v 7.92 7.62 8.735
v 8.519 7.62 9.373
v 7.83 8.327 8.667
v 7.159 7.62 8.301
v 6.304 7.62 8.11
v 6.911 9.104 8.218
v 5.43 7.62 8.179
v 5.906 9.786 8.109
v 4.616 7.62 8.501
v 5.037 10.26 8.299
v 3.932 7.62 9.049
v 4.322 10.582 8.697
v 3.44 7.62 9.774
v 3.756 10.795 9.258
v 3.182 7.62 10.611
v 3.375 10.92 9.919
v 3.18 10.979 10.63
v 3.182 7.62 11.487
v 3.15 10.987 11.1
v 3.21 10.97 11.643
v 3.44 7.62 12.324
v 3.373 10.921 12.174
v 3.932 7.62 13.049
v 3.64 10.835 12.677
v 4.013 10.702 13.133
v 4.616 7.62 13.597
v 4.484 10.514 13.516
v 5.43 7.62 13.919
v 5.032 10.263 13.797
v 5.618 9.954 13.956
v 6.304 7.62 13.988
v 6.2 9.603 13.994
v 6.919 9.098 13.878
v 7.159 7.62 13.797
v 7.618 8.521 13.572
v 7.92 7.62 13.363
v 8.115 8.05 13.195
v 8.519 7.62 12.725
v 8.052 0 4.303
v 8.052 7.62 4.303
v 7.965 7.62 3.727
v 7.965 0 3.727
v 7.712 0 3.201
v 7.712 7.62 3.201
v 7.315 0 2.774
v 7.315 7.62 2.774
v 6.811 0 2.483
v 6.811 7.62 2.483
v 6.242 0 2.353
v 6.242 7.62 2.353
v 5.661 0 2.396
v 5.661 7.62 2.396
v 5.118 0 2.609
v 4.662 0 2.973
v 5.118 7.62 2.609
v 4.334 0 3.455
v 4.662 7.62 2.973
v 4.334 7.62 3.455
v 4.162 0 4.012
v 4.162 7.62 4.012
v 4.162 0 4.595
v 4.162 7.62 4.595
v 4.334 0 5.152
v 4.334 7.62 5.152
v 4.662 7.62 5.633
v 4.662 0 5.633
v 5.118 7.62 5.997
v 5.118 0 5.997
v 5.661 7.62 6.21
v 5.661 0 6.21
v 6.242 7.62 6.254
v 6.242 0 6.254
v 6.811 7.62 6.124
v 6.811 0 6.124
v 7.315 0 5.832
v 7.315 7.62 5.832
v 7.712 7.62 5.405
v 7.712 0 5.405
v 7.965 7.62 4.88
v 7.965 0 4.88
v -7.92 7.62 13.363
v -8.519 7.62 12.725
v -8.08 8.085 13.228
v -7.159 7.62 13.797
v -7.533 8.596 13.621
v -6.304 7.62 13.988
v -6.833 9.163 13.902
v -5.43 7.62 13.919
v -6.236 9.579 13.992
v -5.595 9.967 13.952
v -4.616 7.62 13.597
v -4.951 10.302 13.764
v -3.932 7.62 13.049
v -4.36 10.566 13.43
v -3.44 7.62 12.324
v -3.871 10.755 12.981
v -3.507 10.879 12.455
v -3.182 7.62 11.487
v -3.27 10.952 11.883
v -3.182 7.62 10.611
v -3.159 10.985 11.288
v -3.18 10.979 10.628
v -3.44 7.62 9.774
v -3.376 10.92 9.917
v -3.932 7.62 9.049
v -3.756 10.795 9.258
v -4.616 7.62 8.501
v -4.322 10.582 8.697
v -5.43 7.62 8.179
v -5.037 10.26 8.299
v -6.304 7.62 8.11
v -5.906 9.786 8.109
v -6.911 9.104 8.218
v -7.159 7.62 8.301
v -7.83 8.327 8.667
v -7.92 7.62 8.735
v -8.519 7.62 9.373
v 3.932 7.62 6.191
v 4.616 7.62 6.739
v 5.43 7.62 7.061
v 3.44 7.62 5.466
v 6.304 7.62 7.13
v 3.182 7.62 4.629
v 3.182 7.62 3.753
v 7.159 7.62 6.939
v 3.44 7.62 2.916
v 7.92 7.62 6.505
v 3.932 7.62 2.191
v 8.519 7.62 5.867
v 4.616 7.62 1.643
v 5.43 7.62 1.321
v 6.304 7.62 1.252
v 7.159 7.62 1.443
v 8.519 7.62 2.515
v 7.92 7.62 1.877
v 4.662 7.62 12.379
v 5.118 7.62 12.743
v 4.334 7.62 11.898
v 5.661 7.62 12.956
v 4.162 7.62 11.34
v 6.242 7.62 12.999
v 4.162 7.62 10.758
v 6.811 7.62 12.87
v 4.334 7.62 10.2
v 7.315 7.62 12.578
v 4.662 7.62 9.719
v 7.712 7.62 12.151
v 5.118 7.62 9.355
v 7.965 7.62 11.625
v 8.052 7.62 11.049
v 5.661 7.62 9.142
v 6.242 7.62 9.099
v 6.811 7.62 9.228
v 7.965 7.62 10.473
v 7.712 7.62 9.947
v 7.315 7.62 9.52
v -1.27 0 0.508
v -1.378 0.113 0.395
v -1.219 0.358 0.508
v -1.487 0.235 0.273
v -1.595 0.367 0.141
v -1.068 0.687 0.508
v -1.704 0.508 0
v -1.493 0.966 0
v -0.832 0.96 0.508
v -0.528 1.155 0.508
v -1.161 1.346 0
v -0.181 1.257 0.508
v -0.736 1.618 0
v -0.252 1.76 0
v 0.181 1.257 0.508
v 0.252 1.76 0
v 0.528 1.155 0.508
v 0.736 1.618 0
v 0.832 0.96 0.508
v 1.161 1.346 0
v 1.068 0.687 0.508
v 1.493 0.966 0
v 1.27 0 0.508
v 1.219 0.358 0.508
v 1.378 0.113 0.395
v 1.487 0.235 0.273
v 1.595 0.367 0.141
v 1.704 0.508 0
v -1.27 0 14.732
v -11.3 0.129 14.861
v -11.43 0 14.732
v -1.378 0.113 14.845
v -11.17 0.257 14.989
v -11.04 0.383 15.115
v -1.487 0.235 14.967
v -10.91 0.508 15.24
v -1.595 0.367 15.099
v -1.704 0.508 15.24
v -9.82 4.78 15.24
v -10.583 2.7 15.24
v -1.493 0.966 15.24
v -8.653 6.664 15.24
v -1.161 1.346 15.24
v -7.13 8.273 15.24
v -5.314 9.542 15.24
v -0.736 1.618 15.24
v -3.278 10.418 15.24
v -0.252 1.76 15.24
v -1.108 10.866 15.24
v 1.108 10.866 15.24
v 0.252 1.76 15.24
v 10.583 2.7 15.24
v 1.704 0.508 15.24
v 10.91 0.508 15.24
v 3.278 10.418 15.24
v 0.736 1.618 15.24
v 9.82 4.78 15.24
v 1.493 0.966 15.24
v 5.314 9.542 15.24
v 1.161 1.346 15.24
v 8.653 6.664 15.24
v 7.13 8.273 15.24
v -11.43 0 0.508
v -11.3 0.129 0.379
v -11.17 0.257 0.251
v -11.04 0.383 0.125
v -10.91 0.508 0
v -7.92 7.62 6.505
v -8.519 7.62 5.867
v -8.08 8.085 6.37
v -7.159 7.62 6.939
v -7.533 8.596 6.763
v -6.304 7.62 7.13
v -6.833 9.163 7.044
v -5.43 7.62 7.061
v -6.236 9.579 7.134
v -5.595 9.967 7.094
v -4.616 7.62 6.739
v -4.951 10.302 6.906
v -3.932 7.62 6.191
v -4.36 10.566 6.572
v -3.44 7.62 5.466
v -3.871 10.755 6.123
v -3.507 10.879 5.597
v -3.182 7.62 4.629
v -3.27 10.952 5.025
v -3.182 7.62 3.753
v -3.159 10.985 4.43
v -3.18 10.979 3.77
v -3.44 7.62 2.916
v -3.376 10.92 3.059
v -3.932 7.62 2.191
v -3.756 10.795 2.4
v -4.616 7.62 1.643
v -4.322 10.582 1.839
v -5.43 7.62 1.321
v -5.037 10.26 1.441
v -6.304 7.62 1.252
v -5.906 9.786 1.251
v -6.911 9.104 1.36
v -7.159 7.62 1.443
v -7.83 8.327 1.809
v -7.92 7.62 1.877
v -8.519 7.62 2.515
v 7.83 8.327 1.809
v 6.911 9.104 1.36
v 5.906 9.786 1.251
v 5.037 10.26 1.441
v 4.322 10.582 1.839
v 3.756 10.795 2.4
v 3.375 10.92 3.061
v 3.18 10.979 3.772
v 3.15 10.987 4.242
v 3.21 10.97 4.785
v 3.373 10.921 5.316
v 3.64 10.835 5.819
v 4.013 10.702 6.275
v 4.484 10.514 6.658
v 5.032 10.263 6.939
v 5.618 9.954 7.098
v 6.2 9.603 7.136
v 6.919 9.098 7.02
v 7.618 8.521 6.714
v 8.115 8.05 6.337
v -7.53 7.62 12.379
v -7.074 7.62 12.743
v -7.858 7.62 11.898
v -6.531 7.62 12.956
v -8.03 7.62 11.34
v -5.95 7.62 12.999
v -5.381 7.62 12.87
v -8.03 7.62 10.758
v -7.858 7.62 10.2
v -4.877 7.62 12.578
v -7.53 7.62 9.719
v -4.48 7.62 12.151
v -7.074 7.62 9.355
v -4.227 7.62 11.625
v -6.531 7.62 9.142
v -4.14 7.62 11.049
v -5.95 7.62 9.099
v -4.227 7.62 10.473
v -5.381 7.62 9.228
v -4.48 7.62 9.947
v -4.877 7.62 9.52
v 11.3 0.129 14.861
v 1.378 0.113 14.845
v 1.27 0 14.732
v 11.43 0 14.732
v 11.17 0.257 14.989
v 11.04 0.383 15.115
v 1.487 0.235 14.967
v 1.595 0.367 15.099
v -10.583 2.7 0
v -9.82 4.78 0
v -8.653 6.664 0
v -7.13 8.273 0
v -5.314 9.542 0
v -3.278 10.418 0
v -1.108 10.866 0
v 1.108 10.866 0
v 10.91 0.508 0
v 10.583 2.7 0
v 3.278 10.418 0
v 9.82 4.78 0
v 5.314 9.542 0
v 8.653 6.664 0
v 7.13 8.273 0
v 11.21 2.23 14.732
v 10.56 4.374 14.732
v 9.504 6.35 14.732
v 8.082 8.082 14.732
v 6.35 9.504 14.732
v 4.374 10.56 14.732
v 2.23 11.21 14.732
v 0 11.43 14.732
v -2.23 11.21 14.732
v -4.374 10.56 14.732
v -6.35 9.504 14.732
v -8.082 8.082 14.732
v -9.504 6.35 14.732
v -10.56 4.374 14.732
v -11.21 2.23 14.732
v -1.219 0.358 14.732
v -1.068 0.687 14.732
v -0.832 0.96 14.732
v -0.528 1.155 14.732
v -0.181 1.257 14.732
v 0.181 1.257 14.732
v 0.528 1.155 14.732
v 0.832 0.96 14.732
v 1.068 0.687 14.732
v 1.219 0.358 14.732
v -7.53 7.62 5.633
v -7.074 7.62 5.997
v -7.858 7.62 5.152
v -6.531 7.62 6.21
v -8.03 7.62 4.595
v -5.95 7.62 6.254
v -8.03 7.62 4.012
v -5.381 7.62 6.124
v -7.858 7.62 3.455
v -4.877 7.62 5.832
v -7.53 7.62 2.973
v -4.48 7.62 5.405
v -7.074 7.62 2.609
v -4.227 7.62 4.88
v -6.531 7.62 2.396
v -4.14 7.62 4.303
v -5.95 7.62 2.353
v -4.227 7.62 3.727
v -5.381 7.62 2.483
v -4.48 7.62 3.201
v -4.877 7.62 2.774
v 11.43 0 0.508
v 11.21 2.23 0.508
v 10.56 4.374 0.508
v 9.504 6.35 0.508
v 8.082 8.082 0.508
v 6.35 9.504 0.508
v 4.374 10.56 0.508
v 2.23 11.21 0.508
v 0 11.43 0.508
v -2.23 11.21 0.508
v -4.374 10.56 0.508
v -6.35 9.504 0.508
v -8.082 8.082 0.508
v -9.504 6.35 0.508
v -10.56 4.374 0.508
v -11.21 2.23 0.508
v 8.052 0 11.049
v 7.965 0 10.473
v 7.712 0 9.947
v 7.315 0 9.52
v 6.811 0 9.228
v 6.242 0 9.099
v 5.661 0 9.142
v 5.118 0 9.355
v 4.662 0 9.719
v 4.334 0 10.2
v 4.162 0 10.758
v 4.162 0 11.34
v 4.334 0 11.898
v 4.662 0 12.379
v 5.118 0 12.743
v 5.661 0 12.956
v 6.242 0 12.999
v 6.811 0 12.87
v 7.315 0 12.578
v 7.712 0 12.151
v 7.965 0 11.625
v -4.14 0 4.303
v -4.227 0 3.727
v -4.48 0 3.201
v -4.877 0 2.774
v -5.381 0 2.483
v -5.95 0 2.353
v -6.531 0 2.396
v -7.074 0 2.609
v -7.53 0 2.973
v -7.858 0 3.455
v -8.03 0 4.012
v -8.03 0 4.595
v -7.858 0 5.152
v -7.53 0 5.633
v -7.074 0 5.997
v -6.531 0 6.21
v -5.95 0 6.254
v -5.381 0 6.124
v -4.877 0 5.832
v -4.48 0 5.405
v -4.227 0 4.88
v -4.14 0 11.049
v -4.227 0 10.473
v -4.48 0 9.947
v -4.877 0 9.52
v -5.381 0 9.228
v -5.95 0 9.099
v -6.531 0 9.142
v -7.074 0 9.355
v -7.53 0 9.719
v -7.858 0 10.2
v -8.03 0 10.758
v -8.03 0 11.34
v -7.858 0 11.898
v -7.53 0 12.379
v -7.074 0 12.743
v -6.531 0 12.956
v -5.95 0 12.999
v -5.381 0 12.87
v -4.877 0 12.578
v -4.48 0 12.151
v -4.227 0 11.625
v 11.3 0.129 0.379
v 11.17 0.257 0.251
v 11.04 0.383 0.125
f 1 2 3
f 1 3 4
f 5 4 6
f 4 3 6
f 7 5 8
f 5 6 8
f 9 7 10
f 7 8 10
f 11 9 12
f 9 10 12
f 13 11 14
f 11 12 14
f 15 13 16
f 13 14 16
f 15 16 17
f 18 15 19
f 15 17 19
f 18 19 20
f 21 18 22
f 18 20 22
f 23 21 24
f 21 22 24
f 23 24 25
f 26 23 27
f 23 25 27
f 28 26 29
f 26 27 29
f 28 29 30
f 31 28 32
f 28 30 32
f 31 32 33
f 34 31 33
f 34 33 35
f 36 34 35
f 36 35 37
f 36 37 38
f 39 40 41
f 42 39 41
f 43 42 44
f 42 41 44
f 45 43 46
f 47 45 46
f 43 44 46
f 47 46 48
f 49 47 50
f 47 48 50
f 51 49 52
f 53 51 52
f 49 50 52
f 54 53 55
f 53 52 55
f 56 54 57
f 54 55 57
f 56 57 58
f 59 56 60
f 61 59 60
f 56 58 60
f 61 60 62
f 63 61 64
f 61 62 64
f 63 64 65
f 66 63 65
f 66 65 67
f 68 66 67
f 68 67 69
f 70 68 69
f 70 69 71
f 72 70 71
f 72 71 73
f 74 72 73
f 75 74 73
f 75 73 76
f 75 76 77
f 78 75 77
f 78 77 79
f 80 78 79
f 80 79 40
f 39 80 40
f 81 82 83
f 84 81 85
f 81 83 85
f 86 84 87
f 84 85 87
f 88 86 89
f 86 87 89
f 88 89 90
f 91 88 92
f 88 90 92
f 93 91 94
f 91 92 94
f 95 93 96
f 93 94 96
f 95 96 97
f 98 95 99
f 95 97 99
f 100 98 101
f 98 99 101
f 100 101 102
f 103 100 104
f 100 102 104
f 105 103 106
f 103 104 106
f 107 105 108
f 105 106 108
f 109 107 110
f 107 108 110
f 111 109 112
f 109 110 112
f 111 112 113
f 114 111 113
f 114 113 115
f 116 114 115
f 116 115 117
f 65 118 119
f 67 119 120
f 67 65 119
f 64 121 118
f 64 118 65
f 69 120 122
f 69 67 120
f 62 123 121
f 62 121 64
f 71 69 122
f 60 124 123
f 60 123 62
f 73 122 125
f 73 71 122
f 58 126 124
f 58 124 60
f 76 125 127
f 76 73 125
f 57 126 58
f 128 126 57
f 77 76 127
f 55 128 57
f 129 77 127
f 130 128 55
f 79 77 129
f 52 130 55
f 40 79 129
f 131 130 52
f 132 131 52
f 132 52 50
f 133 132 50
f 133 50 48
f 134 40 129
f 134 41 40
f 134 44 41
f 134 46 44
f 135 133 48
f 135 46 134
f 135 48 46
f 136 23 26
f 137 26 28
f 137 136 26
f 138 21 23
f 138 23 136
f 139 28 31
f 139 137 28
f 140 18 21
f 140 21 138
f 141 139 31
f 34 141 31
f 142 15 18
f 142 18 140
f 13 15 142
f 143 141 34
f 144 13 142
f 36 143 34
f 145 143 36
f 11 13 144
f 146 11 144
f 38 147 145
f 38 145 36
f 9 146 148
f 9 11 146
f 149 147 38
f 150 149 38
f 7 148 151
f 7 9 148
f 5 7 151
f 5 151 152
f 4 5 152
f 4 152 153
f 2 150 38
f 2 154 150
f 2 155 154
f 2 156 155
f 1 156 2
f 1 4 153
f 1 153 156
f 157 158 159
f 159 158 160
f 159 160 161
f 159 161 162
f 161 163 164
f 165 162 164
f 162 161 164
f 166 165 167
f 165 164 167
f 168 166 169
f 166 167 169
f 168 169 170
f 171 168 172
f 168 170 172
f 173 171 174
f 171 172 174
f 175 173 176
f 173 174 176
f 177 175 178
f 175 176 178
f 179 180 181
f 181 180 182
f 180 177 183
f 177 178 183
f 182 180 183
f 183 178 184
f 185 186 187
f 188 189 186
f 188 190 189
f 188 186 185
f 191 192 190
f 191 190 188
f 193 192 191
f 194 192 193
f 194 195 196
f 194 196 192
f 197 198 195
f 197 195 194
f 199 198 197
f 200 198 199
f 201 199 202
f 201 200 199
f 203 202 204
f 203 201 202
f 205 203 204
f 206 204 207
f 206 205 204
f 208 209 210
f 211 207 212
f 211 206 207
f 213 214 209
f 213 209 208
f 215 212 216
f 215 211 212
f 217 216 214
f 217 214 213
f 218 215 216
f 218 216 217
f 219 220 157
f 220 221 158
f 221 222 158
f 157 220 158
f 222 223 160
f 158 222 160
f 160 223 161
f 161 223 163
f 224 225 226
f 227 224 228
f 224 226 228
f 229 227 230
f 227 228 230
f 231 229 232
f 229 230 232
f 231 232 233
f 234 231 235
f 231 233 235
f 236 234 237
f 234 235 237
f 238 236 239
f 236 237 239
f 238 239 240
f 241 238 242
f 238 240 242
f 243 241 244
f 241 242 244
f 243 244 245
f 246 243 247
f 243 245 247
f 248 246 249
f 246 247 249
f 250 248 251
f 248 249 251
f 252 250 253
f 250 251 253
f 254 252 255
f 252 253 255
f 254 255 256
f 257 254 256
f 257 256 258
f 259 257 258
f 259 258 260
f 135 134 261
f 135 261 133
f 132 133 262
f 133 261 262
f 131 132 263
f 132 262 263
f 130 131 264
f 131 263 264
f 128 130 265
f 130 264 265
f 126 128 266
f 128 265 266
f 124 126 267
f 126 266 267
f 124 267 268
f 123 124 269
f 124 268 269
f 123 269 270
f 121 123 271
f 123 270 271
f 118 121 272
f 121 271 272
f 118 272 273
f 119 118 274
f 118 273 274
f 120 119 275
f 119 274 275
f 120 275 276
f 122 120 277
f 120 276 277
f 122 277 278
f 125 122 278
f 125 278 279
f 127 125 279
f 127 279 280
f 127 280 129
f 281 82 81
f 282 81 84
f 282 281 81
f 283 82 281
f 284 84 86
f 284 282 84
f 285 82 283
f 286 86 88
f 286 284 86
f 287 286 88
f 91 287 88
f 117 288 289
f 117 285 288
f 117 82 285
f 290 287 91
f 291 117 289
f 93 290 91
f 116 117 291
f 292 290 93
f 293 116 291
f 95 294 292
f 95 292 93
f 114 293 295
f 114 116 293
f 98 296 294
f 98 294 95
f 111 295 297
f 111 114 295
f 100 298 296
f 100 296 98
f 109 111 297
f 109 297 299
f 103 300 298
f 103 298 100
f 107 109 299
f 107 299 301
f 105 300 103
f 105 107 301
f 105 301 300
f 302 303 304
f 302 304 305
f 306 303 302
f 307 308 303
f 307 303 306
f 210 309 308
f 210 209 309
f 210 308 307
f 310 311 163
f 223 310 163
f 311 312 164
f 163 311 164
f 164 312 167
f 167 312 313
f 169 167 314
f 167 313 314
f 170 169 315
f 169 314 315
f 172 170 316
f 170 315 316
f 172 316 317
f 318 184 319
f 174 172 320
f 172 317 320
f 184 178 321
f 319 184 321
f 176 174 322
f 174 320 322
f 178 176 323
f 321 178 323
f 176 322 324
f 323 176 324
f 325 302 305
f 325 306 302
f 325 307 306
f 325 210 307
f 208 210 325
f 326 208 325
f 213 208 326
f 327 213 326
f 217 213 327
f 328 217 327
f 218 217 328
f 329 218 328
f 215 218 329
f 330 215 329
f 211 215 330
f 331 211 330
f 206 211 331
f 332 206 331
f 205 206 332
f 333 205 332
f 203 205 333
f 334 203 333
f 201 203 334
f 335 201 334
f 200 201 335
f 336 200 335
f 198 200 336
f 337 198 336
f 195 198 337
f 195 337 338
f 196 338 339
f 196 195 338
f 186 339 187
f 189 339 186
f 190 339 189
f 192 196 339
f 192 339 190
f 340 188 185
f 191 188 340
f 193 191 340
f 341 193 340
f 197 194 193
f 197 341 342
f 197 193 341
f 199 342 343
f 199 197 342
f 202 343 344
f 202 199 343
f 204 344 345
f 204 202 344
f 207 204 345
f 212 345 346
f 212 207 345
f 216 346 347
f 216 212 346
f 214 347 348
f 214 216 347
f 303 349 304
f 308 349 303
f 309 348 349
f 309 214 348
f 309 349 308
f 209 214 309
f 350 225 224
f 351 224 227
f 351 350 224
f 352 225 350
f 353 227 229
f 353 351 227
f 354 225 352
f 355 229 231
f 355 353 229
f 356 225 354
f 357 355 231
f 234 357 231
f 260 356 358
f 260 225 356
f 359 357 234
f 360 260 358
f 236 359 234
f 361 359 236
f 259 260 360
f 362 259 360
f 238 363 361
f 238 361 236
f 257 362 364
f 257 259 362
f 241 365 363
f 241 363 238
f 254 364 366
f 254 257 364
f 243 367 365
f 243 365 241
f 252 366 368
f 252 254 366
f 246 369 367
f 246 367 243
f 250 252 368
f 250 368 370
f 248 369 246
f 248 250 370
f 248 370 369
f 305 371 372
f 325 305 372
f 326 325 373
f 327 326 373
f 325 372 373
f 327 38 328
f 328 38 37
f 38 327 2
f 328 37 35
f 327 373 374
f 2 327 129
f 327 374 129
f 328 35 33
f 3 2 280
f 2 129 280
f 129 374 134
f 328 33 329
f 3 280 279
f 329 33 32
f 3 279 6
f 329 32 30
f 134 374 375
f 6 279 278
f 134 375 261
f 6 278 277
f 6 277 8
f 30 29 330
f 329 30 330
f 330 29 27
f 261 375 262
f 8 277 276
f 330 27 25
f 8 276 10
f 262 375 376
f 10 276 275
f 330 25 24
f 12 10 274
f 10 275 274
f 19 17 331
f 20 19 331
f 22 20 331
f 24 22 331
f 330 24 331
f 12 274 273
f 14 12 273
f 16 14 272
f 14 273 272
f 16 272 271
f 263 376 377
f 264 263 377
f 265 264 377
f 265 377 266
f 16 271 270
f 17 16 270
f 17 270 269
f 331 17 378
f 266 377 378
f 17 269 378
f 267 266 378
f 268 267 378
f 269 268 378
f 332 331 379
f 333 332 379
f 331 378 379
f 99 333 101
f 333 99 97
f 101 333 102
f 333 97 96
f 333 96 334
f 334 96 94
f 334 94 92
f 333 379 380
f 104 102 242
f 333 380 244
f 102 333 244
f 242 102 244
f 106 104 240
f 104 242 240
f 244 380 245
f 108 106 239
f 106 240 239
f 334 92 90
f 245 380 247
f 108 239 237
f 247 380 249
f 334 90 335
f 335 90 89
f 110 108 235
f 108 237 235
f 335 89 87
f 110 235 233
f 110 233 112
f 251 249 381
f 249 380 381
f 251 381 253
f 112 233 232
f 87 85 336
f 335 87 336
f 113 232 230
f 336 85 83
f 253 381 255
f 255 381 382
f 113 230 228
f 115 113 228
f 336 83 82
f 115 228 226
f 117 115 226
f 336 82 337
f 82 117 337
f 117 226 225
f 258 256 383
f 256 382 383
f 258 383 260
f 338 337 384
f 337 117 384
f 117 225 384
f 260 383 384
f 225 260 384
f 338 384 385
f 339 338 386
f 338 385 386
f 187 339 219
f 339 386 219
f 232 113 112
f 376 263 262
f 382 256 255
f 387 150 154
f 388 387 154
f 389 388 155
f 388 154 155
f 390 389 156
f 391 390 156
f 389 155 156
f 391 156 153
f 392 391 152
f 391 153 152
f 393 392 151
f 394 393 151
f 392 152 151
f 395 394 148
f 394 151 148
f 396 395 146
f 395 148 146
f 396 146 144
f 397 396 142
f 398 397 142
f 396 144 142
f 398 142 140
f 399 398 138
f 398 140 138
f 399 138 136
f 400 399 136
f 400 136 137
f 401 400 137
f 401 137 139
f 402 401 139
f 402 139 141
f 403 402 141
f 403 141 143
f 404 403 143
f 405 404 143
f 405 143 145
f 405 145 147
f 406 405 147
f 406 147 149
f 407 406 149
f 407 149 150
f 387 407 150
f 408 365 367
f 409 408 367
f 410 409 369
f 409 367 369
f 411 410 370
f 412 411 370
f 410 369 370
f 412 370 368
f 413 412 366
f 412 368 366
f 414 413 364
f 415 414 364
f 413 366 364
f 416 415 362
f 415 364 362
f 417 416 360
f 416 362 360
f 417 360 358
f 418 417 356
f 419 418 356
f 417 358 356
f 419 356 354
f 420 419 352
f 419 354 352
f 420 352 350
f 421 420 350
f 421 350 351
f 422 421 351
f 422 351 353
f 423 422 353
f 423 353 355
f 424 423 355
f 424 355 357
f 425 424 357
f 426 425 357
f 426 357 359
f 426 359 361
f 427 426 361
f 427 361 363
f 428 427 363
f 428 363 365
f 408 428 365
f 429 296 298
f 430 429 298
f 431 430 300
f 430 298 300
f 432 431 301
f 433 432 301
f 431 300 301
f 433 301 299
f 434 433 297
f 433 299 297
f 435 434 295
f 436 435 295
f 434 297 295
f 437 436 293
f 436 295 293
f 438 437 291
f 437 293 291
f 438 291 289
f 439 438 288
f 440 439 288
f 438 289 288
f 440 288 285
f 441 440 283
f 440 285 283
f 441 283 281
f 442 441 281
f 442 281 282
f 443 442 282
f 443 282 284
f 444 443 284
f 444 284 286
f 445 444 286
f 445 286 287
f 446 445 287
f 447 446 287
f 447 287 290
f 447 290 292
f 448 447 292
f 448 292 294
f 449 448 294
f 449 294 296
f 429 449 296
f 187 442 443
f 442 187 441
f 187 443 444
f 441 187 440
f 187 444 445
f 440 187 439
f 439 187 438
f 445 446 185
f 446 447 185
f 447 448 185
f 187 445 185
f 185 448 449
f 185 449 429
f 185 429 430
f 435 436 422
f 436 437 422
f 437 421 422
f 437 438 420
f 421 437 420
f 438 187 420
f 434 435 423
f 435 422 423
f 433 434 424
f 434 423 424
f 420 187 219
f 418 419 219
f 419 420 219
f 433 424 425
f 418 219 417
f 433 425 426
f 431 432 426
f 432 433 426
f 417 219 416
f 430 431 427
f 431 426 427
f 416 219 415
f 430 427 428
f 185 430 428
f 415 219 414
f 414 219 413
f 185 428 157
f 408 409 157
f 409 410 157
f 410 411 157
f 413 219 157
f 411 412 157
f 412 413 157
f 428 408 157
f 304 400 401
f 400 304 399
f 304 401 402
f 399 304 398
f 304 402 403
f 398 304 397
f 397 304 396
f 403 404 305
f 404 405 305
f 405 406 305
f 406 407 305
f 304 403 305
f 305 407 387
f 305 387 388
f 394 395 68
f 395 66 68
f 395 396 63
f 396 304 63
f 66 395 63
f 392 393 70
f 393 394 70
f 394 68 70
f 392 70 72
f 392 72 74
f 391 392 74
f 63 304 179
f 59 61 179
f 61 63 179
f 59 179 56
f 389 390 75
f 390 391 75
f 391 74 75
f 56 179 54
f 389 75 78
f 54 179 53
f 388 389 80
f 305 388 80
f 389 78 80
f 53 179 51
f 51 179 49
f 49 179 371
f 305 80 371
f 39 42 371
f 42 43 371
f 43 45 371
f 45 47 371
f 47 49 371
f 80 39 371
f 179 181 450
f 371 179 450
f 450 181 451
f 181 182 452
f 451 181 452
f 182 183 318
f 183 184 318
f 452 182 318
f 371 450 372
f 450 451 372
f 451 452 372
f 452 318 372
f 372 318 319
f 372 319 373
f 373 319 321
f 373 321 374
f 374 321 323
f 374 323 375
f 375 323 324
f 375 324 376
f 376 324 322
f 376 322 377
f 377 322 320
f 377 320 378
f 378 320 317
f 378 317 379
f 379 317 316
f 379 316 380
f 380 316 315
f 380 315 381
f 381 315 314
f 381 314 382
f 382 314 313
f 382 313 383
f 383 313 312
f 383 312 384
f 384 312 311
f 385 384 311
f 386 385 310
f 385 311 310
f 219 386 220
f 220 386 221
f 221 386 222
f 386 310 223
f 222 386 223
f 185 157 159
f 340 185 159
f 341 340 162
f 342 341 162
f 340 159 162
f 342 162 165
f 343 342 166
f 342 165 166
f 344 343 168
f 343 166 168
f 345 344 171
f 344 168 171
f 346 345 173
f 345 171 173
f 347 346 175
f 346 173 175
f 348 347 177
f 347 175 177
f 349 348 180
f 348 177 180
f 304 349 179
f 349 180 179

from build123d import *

# Parameters (mm, degrees)
BOSS_EXTRUDE2_DEPTH = 15.24
CHAMFER1_SIZE       = 0.508
SKETCH4_R           = 2.9464
SKETCH4_R_2         = 1.9558
CUT_EXTRUDE1_DEPTH  = 3.81
SKETCH6_R           = 1.9558
CUT_EXTRUDE2_DEPTH  = 12.4300001


with BuildPart() as part:
    # Sketch2 → Boss-Extrude2 (new body)
    with BuildSketch(Plane.XY):
        with BuildLine():
            Line((-11.43, 0), (-1.27, 0))
            ThreePointArc((-1.27, 0), (0, 1.27), (1.27, 0))
            Line((1.27, 0), (11.43, 0))
            ThreePointArc((11.43, 0), (0, 11.43), (-11.43, 0))
        make_face()
    extrude(amount=BOSS_EXTRUDE2_DEPTH)

    # Chamfer1
    chamfer1_edges = [part.edges().sort_by_distance(p)[0] for p in [
        (0, 11.43, 15.24),
        (-6.35, 0, 15.24),
        (0, 1.27, 15.24),
        (-6.35, 0, 0),
        (0, 11.43, 0),
        (6.35, 0, 0),
        (0, 1.27, 0),
        (6.35, 0, 15.24),
    ]]
    chamfer(chamfer1_edges, length=CHAMFER1_SIZE)

    # Sketch4 → Cut-Extrude1 (cut)
    with BuildSketch(Plane(origin=(0, 11.43, 0), x_dir=(1, 0, 0), z_dir=(0, 1, 0))):
        with Locations((-6.096, -4.191)):
            Circle(SKETCH4_R)
        with Locations((-6.096, -4.303195449)):
            Circle(SKETCH4_R_2, mode=Mode.SUBTRACT)
        with Locations((-6.096, -11.049)):
            Circle(SKETCH4_R)
        with Locations((-6.096, -11.049)):
            Circle(SKETCH4_R_2, mode=Mode.SUBTRACT)
        with Locations((6.096, -4.191)):
            Circle(SKETCH4_R)
        with Locations((6.096, -4.303195449)):
            Circle(SKETCH4_R_2, mode=Mode.SUBTRACT)
        with Locations((6.096, -11.049)):
            Circle(SKETCH4_R)
        with Locations((6.096, -11.049)):
            Circle(SKETCH4_R_2, mode=Mode.SUBTRACT)
    extrude(amount=-CUT_EXTRUDE1_DEPTH, mode=Mode.SUBTRACT)

    # Sketch6 → Cut-Extrude2 (cut, through all)
    with BuildSketch(Plane(origin=(0, 11.43, 0), x_dir=(1, 0, 0), z_dir=(0, 1, 0))):
        with Locations((-6.096, -4.303195449)):
            Circle(SKETCH6_R)
        with Locations((-6.096, -11.049)):
            Circle(SKETCH6_R)
        with Locations((6.096, -11.049)):
            Circle(SKETCH6_R)
        with Locations((6.096, -4.303195449)):
            Circle(SKETCH6_R)
    extrude(amount=-CUT_EXTRUDE2_DEPTH, mode=Mode.SUBTRACT)


solid = part.part
